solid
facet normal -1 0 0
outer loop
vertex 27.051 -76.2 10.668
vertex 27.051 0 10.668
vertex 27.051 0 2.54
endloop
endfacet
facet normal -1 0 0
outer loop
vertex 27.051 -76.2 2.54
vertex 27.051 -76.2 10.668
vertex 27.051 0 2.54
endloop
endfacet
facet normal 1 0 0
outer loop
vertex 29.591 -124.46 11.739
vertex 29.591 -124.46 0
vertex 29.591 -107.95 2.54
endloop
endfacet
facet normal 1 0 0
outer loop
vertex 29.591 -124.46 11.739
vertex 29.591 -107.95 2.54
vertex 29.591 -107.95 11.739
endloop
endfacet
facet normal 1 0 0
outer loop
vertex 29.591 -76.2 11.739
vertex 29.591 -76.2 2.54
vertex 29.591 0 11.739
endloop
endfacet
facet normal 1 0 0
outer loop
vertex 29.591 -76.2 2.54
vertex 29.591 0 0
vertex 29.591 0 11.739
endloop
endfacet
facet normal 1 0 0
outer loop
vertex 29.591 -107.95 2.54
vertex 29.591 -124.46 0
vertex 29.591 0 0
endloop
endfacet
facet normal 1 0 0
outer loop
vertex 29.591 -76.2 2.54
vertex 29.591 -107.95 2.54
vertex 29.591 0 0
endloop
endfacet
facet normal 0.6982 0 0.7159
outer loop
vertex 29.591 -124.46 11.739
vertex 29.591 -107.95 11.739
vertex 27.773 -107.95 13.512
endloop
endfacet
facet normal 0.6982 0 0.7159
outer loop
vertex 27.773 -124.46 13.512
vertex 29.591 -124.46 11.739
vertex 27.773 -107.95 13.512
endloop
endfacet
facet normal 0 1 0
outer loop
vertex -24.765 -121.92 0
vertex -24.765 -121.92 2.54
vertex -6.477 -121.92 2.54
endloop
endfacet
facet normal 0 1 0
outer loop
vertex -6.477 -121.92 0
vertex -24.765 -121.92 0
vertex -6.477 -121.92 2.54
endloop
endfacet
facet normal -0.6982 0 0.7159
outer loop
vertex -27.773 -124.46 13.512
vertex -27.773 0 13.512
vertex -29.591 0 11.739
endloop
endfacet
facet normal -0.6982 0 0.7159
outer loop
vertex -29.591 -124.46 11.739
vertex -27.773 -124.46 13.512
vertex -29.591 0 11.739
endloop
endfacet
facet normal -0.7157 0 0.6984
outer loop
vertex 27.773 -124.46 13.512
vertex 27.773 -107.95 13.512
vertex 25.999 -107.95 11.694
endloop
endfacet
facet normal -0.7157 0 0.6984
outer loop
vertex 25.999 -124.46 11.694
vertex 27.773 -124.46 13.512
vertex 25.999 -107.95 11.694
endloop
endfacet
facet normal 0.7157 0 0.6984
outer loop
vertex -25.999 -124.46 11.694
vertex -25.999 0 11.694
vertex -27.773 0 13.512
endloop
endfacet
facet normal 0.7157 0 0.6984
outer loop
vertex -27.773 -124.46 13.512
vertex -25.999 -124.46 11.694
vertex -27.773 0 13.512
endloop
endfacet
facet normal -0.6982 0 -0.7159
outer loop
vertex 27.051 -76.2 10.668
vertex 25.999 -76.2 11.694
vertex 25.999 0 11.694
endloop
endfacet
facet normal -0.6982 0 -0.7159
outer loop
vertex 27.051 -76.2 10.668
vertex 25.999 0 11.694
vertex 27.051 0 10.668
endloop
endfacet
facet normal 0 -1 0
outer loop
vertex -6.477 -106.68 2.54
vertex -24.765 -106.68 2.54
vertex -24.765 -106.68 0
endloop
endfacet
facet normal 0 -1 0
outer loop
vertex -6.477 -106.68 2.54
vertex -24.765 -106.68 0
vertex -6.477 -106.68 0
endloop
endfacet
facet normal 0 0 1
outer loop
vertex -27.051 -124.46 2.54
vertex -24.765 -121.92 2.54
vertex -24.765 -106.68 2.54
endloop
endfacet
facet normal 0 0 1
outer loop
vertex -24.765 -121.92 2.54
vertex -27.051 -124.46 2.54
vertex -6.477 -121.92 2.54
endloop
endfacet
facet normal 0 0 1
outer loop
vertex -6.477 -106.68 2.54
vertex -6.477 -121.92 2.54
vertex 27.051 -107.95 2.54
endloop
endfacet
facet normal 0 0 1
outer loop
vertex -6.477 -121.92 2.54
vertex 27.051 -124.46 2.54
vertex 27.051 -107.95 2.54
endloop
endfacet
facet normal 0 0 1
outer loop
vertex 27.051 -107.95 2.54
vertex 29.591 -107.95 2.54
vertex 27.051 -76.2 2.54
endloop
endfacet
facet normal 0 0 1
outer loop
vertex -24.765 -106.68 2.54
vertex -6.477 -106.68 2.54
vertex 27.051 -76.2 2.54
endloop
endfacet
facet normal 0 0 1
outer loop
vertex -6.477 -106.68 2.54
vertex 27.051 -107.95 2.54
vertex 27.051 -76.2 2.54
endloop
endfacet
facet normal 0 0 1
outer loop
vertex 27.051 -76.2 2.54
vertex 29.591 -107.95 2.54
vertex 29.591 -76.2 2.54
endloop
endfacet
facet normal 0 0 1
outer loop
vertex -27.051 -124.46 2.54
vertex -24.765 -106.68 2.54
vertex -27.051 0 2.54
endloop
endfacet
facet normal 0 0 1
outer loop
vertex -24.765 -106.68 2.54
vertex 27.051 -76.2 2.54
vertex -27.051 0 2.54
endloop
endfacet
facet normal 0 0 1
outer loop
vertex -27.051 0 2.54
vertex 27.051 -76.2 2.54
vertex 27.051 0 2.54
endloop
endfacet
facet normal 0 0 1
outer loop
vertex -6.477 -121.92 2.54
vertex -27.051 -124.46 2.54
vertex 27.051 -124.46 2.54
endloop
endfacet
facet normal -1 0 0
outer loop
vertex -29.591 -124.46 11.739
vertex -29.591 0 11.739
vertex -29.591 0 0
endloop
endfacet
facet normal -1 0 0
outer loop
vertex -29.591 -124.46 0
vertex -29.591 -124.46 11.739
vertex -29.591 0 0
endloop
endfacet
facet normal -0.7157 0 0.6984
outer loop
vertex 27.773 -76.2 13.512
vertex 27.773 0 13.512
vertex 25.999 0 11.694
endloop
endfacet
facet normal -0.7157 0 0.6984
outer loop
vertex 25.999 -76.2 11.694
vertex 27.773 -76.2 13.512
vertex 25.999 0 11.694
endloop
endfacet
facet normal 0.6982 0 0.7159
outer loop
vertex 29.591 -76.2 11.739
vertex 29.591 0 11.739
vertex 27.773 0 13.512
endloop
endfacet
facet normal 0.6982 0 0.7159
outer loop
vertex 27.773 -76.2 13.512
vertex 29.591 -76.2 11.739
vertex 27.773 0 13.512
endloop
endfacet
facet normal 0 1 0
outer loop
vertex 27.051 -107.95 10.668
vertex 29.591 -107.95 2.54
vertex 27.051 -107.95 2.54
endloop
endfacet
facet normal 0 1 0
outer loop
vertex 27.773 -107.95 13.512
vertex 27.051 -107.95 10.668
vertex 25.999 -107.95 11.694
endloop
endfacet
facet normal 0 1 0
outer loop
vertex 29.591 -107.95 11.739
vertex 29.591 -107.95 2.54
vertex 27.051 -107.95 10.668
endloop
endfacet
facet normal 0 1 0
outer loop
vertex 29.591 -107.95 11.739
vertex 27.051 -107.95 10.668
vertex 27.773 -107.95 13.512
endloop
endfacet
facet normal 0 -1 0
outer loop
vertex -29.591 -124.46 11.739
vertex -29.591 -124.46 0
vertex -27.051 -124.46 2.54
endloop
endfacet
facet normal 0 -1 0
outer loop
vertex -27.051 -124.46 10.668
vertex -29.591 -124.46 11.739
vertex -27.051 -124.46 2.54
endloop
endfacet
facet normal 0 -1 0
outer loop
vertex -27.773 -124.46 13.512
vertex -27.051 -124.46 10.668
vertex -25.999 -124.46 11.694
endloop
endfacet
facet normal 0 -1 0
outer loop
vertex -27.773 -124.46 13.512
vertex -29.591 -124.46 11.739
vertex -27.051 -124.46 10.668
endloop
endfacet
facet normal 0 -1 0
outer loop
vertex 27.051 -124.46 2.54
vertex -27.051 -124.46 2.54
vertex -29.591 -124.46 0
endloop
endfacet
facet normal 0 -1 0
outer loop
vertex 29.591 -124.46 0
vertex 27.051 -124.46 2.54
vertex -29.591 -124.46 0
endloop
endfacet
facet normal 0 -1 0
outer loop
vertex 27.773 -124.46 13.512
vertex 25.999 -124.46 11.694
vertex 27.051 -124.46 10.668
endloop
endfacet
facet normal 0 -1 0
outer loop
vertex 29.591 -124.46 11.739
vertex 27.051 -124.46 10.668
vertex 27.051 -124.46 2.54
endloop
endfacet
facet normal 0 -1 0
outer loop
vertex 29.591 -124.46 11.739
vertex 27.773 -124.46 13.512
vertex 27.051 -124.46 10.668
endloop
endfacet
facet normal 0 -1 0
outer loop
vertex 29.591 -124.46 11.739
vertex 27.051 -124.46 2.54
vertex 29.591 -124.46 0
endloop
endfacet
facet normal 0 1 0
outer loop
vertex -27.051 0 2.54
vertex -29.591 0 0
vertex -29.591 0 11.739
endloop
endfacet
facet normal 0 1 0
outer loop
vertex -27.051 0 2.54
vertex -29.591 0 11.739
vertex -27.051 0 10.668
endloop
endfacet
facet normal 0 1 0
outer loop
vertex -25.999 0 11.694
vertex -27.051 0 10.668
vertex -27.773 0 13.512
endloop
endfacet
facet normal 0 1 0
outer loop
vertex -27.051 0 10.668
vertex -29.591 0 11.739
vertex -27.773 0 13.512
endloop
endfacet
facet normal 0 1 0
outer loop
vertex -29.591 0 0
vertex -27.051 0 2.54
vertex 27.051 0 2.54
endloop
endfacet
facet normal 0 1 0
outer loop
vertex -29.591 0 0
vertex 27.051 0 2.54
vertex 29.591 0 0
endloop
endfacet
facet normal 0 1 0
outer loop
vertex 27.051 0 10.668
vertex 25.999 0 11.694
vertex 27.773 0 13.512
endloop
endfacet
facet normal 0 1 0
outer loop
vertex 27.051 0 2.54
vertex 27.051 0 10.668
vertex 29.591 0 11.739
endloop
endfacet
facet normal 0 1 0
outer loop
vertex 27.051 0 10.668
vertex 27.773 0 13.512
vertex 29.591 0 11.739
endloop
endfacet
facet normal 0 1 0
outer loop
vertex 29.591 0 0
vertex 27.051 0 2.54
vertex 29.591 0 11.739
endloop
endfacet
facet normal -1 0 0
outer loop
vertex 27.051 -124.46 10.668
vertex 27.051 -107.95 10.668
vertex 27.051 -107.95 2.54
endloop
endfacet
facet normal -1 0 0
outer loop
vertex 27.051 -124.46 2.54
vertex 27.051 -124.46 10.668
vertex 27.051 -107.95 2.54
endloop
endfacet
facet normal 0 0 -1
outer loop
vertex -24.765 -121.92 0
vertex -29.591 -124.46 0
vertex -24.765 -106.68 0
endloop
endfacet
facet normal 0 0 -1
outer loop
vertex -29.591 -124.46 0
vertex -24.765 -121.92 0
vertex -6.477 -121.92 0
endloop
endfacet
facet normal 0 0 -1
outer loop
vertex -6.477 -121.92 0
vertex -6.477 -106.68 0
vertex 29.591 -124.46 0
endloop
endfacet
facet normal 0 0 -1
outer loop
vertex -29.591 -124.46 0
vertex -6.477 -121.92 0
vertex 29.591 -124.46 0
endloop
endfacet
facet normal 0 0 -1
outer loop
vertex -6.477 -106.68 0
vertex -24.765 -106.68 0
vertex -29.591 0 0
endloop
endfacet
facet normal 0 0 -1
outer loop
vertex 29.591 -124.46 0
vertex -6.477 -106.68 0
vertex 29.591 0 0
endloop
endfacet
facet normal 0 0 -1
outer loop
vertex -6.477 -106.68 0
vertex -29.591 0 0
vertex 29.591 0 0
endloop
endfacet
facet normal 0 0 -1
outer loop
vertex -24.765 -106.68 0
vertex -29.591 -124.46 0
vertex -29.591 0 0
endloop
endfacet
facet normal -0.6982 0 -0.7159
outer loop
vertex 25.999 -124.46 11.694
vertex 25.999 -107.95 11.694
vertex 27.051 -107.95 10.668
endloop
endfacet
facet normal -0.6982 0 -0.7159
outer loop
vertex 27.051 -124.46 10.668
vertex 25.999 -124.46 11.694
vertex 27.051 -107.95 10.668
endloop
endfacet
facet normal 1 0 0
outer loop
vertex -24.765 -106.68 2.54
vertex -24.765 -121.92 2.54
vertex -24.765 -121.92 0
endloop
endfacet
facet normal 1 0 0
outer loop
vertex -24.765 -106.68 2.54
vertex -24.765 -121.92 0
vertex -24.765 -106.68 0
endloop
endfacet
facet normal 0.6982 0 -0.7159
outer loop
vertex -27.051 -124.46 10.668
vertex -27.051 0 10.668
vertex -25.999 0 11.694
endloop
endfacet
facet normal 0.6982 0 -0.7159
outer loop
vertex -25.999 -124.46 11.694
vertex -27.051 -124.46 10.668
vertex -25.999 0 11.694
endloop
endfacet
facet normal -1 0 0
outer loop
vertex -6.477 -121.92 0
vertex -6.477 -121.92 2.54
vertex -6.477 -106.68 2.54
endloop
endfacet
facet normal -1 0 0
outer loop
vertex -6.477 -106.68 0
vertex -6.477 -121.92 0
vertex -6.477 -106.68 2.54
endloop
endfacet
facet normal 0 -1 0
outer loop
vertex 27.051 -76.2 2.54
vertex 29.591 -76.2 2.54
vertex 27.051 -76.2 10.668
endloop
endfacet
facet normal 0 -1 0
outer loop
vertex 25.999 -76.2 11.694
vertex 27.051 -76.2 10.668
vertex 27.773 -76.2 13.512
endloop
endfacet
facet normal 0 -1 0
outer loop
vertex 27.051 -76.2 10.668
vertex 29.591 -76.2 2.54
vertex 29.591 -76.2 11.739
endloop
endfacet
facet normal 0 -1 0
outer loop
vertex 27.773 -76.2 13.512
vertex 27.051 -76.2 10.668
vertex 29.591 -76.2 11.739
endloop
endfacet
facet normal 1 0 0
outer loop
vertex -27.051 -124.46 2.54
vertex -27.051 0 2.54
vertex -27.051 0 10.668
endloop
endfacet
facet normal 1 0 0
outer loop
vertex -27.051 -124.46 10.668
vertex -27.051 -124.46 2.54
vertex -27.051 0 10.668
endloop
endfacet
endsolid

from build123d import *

# Parameters (mm, degrees)
F1_DEPTH = 124.46
F2_W     = 31.75
F2_H     = 24.671034
F3_DEPTH = 8.636
F4_W     = 18.288
F4_H     = 15.24
F5_DEPTH = 2.541


with BuildPart() as f1:
    # F0 (on Front) → F1 (new body)
    with BuildSketch(Plane.XZ):
        Polygon((-29.591, 0), (0, 0), (29.591, 0), (29.591, 11.738517), (27.772915, 13.512261), (25.999171, 11.694176), (27.051, 10.668), (27.051, 2.54), (0, 2.54), (-27.051, 2.54), (-27.051, 10.668), (-25.999171, 11.694176), (-27.772915, 13.512261), (-29.591, 11.738517), align=None)
    extrude(amount=F1_DEPTH)

    # F2 (on face) → F3 (cut)
    with BuildSketch(Plane.YZ.offset(29.591)):
        with Locations((-92.075, 14.875517)):
            Rectangle(F2_W, F2_H)
    extrude(amount=-F3_DEPTH, mode=Mode.SUBTRACT)

    # F4 (on face) → F5 (cut, through all)
    with BuildSketch(Plane.XY.offset(2.54)):
        with Locations((-15.621, -114.3)):
            Rectangle(F4_W, F4_H)
    extrude(amount=-F5_DEPTH, mode=Mode.SUBTRACT)


solid = f1.part
